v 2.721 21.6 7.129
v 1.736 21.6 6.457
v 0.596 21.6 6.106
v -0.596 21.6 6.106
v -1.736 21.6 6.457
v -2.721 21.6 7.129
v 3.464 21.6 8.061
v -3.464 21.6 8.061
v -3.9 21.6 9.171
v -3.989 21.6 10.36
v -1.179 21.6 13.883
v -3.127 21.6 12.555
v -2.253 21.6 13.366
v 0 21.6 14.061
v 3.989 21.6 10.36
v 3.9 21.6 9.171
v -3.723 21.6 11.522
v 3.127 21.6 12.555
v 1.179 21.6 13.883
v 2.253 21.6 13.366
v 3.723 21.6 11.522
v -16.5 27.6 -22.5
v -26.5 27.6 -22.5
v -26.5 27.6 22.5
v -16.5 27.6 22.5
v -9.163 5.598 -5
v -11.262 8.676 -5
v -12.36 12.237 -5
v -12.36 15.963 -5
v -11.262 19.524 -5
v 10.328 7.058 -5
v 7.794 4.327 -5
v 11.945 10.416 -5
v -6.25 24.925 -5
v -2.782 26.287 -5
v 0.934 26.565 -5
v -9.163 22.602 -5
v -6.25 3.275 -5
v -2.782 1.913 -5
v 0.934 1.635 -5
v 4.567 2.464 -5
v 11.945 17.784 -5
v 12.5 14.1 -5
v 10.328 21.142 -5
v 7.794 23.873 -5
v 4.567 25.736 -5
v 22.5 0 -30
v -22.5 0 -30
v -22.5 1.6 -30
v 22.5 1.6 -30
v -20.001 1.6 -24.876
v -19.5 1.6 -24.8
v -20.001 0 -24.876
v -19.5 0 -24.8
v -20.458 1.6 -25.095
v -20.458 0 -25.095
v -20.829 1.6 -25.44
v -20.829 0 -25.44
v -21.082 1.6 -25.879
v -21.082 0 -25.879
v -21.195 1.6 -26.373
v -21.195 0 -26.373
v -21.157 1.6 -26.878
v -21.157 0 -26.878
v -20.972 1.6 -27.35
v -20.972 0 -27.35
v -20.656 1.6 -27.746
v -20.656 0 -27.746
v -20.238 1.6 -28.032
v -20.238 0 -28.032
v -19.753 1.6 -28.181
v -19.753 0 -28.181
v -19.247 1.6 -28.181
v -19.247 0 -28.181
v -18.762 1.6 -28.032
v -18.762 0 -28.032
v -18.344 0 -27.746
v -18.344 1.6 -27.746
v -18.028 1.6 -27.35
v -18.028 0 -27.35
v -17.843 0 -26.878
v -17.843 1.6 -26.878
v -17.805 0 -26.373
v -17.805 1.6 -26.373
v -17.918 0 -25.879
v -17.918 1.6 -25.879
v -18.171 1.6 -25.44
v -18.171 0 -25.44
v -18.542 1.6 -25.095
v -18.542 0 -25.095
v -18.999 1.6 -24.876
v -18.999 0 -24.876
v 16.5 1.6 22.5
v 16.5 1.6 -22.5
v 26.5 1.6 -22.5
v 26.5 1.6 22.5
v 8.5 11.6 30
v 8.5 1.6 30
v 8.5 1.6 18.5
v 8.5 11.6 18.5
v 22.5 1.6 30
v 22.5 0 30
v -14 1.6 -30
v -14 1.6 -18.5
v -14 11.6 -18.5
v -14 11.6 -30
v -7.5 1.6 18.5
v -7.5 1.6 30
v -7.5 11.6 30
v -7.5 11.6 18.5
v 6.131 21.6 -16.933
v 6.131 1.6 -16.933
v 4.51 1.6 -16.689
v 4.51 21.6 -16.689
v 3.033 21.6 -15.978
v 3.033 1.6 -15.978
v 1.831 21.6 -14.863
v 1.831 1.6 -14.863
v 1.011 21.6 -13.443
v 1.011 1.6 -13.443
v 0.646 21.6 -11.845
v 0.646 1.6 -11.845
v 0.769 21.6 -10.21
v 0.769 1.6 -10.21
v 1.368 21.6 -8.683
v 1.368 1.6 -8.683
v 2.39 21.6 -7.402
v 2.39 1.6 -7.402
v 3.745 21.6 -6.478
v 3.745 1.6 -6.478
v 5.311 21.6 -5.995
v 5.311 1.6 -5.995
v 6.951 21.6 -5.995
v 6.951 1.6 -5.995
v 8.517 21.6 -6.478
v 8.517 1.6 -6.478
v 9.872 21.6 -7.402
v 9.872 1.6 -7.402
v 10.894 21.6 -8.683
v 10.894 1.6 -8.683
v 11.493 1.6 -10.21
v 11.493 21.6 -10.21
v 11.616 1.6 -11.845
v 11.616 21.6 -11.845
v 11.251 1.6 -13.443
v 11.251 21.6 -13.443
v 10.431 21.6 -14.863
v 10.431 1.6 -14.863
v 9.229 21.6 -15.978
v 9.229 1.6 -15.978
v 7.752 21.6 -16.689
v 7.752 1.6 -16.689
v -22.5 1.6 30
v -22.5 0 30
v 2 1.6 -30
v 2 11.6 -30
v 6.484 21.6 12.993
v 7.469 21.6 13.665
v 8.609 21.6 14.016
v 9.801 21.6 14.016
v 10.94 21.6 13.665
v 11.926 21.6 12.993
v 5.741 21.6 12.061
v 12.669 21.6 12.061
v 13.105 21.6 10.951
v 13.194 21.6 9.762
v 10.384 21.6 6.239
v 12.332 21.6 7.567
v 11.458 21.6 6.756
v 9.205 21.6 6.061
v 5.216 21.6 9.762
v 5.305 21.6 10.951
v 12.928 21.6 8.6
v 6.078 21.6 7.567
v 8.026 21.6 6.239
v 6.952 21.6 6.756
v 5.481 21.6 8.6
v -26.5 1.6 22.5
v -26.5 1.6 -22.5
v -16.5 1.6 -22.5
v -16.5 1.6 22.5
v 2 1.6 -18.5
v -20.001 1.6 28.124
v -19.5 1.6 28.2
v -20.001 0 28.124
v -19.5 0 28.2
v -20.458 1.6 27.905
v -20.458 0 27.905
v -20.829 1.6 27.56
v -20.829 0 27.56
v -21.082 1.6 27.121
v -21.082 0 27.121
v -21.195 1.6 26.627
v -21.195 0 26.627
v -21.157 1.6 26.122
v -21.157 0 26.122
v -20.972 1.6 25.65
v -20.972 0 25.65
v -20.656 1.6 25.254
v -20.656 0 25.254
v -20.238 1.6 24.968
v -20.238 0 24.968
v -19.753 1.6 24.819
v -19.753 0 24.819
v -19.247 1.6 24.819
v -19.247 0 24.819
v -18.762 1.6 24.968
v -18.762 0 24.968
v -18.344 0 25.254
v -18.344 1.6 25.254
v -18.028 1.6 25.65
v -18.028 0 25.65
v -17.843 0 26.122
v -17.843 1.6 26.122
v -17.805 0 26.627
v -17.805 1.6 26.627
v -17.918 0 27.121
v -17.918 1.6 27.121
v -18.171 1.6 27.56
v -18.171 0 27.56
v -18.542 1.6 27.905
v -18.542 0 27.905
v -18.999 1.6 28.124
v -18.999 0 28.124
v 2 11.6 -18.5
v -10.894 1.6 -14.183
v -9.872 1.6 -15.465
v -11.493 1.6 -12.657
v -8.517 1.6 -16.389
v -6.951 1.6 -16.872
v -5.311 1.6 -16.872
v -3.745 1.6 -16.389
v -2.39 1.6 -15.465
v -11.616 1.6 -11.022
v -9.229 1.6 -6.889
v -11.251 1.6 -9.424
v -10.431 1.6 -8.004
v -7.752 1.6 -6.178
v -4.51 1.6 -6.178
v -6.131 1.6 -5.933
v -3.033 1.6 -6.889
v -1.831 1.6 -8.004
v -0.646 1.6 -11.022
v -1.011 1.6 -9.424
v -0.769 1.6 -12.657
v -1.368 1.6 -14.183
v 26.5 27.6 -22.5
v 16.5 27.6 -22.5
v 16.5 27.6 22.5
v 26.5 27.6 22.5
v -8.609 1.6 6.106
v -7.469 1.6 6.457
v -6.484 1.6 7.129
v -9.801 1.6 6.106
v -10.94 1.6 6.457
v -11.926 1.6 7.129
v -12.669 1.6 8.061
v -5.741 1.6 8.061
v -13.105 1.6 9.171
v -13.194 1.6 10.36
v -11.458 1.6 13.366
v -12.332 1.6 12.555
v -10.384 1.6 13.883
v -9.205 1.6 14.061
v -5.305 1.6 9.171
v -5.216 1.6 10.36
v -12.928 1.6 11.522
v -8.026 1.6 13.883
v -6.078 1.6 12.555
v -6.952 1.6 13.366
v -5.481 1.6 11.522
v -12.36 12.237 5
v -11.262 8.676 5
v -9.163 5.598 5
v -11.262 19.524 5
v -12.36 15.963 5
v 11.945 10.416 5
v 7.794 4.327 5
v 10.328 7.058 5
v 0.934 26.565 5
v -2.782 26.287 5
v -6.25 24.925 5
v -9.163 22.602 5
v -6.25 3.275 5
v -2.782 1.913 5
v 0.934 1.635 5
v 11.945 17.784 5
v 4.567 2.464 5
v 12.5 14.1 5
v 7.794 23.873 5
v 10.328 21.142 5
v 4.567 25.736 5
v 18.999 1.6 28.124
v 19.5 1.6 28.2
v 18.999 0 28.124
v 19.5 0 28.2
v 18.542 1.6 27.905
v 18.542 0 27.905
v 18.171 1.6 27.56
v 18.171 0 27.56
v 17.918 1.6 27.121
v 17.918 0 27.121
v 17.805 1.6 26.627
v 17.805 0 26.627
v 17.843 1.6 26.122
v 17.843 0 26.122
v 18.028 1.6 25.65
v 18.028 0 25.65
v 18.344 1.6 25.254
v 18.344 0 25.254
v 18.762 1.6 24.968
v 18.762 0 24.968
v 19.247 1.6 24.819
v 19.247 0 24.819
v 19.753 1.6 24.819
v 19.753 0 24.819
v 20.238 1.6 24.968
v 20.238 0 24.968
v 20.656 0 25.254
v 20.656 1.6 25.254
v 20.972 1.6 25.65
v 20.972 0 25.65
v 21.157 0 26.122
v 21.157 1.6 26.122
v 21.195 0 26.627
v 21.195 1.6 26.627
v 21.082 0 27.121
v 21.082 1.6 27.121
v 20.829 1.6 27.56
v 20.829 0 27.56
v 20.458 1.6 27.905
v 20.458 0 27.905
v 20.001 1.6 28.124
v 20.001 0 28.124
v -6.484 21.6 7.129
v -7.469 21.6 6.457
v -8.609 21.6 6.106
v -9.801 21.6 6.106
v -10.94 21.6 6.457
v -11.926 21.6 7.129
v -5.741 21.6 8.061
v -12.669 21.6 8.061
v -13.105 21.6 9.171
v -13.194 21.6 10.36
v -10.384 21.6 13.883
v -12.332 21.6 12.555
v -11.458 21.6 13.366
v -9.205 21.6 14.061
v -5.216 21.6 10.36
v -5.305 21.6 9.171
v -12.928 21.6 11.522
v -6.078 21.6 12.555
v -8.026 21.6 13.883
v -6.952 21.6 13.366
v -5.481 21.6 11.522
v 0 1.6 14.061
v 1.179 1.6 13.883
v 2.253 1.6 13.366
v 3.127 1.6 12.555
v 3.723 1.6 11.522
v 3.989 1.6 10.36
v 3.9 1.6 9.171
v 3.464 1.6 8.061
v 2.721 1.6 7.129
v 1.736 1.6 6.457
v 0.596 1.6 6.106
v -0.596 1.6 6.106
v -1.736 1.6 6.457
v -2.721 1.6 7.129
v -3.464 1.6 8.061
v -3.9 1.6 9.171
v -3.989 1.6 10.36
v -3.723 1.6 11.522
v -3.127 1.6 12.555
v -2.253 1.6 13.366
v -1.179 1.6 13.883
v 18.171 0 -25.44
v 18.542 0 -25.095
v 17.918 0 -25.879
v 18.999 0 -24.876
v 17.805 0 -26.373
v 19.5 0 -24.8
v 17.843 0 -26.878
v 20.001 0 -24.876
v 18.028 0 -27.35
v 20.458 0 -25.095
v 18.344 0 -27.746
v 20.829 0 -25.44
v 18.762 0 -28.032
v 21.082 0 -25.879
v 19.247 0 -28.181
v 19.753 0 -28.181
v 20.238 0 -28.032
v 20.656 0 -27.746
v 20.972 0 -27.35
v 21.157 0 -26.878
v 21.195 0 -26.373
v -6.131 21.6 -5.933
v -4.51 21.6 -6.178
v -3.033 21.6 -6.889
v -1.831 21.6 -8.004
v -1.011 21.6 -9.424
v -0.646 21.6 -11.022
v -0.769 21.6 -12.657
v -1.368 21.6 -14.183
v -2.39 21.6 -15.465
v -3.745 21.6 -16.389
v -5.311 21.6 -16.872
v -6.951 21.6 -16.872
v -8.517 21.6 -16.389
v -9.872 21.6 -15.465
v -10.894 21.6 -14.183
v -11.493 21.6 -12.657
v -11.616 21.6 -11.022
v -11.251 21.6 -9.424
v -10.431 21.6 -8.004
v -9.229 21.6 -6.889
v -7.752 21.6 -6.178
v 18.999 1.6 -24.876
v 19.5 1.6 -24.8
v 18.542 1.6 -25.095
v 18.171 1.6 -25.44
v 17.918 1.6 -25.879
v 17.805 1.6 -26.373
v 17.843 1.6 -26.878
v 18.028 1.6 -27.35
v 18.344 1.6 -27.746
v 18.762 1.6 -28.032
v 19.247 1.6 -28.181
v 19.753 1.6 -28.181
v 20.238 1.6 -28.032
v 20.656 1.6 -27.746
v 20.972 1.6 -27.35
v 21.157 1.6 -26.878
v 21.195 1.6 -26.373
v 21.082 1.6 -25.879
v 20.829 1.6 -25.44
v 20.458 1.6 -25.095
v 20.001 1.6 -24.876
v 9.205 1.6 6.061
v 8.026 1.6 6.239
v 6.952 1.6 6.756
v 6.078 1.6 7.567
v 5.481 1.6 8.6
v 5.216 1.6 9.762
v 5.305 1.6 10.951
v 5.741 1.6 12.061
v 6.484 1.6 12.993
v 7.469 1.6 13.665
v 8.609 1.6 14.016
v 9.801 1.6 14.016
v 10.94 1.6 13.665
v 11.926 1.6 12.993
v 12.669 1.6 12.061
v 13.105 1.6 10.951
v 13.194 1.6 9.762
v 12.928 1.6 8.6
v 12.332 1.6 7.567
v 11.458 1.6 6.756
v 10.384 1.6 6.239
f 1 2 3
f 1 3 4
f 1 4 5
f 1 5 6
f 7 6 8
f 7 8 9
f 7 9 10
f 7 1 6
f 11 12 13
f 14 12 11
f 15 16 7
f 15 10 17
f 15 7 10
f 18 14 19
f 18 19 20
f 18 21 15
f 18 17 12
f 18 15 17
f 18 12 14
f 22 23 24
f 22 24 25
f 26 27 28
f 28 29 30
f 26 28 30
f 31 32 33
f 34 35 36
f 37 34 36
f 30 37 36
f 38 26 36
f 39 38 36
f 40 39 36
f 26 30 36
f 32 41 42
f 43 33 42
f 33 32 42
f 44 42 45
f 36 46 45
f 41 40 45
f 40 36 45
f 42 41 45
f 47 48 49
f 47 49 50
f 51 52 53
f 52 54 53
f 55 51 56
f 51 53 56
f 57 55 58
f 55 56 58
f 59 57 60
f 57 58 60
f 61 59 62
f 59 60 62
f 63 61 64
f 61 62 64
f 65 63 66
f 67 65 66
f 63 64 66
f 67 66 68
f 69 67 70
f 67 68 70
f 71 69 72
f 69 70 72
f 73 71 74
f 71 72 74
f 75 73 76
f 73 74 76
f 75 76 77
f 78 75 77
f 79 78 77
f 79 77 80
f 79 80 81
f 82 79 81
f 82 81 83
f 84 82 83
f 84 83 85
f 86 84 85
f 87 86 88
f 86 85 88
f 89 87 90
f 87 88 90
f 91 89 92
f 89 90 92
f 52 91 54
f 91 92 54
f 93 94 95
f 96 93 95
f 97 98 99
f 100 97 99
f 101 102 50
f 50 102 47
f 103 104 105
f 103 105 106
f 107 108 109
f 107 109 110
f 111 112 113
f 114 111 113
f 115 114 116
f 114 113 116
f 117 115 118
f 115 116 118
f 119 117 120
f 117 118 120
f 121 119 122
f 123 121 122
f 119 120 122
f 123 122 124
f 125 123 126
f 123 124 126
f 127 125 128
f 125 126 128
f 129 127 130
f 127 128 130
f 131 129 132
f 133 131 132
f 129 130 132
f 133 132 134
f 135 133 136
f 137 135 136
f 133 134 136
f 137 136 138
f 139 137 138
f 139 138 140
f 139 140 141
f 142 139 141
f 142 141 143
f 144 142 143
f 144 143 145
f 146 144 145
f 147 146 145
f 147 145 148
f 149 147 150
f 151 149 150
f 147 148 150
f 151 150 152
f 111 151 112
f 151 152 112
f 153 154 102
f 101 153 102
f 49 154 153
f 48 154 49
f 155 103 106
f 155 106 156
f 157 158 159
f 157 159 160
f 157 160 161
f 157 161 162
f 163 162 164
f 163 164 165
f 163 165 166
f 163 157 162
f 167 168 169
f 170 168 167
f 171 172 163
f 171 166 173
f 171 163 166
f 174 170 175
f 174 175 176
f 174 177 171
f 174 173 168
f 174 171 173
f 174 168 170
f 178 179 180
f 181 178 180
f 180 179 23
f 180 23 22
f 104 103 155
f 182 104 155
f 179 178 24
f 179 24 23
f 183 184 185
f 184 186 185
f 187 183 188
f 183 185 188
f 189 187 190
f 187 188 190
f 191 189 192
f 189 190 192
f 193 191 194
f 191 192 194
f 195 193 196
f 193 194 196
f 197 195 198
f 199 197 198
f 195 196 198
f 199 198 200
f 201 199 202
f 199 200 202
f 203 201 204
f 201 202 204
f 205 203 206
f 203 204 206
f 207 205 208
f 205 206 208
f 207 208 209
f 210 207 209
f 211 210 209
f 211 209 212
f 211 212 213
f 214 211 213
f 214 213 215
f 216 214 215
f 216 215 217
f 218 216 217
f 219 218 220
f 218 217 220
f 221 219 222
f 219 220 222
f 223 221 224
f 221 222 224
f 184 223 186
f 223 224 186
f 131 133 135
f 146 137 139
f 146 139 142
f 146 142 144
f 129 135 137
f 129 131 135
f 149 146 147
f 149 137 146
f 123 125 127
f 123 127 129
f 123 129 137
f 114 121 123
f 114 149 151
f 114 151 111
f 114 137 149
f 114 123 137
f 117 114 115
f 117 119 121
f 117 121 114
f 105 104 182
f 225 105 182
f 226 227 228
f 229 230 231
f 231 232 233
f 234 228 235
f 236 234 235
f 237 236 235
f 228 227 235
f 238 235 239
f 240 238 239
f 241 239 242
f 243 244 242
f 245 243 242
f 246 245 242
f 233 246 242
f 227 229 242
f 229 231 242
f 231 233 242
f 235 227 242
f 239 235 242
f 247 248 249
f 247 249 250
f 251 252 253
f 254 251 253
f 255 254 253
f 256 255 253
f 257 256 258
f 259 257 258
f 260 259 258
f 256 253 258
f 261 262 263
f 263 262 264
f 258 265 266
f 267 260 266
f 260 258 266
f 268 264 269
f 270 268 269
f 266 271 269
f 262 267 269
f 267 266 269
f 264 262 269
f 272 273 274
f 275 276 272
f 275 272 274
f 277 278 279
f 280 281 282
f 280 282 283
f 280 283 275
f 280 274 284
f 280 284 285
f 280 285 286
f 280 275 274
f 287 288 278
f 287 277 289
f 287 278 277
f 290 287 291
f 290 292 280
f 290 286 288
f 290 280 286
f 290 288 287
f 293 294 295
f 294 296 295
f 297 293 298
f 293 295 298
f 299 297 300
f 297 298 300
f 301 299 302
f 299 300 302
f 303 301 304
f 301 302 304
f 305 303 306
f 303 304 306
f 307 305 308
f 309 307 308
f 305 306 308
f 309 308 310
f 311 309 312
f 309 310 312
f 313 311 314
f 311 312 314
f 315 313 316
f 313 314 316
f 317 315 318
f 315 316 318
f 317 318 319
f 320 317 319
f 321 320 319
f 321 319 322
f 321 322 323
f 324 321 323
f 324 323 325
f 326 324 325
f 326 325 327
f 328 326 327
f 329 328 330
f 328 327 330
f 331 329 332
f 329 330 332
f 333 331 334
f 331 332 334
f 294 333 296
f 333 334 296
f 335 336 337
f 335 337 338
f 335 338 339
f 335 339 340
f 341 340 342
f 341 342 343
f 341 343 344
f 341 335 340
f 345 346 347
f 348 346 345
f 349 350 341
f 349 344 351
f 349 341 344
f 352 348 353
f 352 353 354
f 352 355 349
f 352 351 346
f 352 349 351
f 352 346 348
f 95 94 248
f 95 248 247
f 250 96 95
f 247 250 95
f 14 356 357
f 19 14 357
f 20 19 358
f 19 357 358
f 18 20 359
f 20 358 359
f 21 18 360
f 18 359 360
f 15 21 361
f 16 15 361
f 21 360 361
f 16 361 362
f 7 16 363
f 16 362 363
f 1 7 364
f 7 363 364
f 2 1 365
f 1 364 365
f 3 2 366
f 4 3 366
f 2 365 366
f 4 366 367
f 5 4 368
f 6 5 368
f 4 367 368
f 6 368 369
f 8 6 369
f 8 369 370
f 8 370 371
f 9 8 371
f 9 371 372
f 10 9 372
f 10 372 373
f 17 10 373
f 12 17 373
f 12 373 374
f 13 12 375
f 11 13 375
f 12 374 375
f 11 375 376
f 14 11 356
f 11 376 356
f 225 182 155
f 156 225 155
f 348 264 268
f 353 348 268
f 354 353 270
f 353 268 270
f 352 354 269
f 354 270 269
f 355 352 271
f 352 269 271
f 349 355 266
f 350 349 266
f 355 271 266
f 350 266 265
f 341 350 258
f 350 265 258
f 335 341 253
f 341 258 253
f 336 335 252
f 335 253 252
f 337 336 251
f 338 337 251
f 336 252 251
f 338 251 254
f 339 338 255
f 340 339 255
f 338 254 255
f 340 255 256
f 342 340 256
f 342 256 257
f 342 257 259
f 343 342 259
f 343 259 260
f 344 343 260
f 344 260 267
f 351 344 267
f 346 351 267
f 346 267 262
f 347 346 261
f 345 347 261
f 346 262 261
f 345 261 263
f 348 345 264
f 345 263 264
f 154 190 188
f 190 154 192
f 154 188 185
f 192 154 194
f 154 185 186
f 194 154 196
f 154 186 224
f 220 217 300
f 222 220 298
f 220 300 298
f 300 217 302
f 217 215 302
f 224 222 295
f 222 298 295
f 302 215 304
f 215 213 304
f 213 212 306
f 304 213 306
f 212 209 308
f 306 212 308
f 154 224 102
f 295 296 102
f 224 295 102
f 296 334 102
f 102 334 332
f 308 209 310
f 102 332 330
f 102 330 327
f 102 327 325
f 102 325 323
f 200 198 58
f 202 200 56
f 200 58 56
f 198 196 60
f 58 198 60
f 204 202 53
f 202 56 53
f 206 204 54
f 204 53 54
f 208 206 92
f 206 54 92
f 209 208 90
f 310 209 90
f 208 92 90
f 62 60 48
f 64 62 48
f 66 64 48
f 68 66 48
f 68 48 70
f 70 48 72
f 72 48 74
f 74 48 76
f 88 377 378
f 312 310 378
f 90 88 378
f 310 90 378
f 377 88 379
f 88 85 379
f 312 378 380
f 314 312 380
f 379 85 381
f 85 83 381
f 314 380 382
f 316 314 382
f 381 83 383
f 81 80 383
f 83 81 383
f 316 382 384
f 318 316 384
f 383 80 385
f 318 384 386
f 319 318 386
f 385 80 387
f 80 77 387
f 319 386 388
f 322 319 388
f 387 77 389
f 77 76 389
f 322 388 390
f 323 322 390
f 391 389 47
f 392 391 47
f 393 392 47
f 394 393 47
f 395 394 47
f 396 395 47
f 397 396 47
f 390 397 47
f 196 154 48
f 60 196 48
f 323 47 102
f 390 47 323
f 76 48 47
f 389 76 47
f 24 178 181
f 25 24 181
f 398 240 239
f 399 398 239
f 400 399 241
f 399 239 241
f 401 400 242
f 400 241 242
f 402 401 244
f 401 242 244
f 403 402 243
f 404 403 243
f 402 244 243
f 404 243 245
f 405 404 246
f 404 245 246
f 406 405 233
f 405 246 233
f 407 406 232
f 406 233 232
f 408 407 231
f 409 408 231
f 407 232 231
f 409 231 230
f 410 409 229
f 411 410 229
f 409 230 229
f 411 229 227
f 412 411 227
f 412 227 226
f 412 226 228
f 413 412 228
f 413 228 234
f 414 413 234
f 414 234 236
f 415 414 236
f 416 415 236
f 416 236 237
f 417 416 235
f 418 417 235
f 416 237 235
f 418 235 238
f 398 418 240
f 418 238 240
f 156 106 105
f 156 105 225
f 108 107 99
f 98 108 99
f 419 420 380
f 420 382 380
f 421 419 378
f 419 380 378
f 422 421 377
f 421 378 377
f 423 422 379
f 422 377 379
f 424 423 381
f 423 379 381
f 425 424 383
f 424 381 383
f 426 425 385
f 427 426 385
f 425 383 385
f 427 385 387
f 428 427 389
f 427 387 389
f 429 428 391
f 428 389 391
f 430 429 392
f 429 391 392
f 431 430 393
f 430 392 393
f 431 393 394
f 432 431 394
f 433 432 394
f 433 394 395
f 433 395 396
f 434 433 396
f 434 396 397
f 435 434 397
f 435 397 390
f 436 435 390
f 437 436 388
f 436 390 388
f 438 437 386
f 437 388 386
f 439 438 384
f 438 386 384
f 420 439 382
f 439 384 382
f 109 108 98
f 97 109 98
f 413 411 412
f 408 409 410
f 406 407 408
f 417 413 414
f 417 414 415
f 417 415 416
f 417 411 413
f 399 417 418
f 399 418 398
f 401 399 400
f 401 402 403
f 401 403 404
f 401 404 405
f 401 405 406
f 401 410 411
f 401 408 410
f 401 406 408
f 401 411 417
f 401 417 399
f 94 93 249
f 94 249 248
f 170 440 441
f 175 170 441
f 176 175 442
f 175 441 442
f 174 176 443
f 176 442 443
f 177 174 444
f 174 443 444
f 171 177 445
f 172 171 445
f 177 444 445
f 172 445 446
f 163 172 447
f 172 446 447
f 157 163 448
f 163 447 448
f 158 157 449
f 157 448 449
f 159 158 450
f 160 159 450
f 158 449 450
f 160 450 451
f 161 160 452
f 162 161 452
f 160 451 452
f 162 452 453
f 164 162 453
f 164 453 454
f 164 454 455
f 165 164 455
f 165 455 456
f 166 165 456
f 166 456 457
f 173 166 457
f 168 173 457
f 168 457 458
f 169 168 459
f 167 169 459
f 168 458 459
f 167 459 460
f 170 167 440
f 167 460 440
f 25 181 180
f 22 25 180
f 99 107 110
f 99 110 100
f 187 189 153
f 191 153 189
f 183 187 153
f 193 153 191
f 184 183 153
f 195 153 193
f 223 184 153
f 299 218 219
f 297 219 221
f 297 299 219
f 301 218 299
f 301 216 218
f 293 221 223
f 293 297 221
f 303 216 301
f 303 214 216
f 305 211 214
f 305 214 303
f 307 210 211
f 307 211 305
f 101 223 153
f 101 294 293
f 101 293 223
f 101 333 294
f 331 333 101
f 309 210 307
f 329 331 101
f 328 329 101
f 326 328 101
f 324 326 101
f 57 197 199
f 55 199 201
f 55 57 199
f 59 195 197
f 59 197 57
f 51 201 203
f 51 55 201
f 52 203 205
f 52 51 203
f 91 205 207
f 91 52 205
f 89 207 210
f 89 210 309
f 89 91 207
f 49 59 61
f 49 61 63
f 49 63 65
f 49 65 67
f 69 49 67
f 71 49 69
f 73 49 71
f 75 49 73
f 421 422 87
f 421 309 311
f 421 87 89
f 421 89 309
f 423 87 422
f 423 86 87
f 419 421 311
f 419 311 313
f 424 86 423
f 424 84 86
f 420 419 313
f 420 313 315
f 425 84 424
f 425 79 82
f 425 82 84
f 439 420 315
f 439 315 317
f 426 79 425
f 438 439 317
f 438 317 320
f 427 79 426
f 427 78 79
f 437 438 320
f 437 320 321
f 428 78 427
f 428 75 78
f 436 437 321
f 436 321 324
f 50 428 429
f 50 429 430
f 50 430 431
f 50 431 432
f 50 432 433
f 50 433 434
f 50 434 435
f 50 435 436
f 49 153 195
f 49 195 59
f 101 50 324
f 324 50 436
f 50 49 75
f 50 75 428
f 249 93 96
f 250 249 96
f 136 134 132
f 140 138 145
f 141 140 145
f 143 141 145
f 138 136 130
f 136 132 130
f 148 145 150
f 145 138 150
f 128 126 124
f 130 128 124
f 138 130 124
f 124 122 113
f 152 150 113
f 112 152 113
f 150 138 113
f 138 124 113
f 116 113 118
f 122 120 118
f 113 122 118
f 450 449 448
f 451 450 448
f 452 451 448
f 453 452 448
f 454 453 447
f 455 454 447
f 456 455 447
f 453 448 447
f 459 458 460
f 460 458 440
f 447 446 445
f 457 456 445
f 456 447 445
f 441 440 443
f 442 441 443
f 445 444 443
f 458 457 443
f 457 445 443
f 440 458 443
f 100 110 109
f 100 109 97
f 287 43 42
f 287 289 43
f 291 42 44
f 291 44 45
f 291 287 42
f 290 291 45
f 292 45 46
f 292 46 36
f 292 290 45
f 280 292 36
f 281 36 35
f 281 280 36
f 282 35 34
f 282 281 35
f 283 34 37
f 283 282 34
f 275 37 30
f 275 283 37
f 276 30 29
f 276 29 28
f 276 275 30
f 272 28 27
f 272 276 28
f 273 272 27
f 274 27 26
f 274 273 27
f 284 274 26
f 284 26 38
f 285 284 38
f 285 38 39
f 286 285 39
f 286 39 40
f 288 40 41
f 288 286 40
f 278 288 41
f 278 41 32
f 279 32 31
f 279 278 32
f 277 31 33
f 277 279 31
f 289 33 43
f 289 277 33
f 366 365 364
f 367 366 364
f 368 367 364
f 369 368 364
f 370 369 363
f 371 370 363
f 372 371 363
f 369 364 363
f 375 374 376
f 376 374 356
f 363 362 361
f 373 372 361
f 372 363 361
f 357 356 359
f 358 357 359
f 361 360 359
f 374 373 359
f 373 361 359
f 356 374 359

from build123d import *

# Parameters (mm, degrees)
ESQUISSE1_W               = 45
ESQUISSE1_H               = 60
BOSS_EXTRU_1_DEPTH        = 1.6
ESQUISSE2_W               = 10
ESQUISSE2_H               = 45
BOSS_EXTRU_2_DEPTH        = 26
BOSS_EXTRU_2_2_DEPTH      = 26
ESQUISSE5_W               = 1.7
ESQUISSE5_H               = 1.6
D_GAGEMENT_M31_AT_2_COUNT = 2
D_GAGEMENT_M31_AT_2_PITCH = 53
D_GAGEMENT_M31_AT_3_COUNT = 2
D_GAGEMENT_M31_AT_3_PITCH = 39
D_GAGEMENT_M31_AT_4_COUNT = 2
D_GAGEMENT_M31_AT_4_PITCH = 65.802735505
ESQUISSE6_W               = 16
ESQUISSE6_H               = 11.5
BOSS_EXTRU_3_DEPTH        = 10
BOSS_EXTRU_3_2_DEPTH      = 10
ESQUISSE8_R               = 12.5
BOSS_EXTRU_6_DEPTH        = 5
ESQUISSE7_R               = 5.5
BOSS_EXTRU_4_DEPTH        = 20
BOSS_EXTRU_4_2_DEPTH      = 20
ESQUISSE7_R_2             = 4
BOSS_EXTRU_4_3_DEPTH      = 20
BOSS_EXTRU_4_4_DEPTH      = 20
BOSS_EXTRU_4_5_DEPTH      = 20


with BuildPart() as part:
    # Esquisse1 → Boss.-Extru.1 (new body)
    with BuildSketch(Plane(origin=(0, 0, 0), x_dir=(1, 0, 0), z_dir=(0, 1, 0))):
        Rectangle(ESQUISSE1_W, ESQUISSE1_H)
    extrude(amount=BOSS_EXTRU_1_DEPTH)

    # Esquisse5 → Dégagement M31 (revolve, cut)
    with BuildSketch(Plane(origin=(-19.5, 1.6, -26.5), x_dir=(0, 0, 1), z_dir=(1, 0, 0))):
        with Locations((0.85, 0.8)):
            Rectangle(ESQUISSE5_W, ESQUISSE5_H)
    d_gagement_m31 = revolve(axis=Axis((-19.5, 7.95, -26.5), (0, -1, 0)), mode=Mode.SUBTRACT)

    # Dégagement M31 at 2: Dégagement M31 ×2
    with Locations(*[(0, 0, i * D_GAGEMENT_M31_AT_2_PITCH) for i in range(1, D_GAGEMENT_M31_AT_2_COUNT)]):
        add(d_gagement_m31, mode=Mode.SUBTRACT)

    # Dégagement M31 at 3: Dégagement M31 ×2
    with Locations(*[(i * D_GAGEMENT_M31_AT_3_PITCH, 0, 0) for i in range(1, D_GAGEMENT_M31_AT_3_COUNT)]):
        add(d_gagement_m31, mode=Mode.SUBTRACT)

    # Dégagement M31 at 4: Dégagement M31 ×2
    with Locations(*[Vector(0.5926805276472259, 0, 0.8054376401359735) * (i * D_GAGEMENT_M31_AT_4_PITCH) for i in range(1, D_GAGEMENT_M31_AT_4_COUNT)]):
        add(d_gagement_m31, mode=Mode.SUBTRACT)


with BuildPart() as body_2:
    # Esquisse2 → Boss.-Extru.2 (new body)
    with BuildSketch(Plane(origin=(0, 1.6, 0), x_dir=(1, 0, 0), z_dir=(0, 1, 0))):
        with Locations((-21.5, 0)):
            Rectangle(ESQUISSE2_W, ESQUISSE2_H)
    extrude(amount=BOSS_EXTRU_2_DEPTH)


with BuildPart() as body_3:
    # Esquisse2 → Boss.-Extru.2 2 (new body)
    with BuildSketch(Plane(origin=(0, 1.6, 0), x_dir=(1, 0, 0), z_dir=(0, 1, 0))):
        with Locations((21.5, 0)):
            Rectangle(ESQUISSE2_W, ESQUISSE2_H)
    extrude(amount=BOSS_EXTRU_2_2_DEPTH)


with BuildPart() as body_4:
    # Esquisse6 → Boss.-Extru.3 (new body)
    with BuildSketch(Plane(origin=(0, 1.6, 0), x_dir=(1, 0, 0), z_dir=(0, 1, 0))):
        with Locations((0.5, -24.25)):
            Rectangle(ESQUISSE6_W, ESQUISSE6_H)
    extrude(amount=BOSS_EXTRU_3_DEPTH)


with BuildPart() as body_5:
    # Esquisse6 → Boss.-Extru.3 2 (new body)
    with BuildSketch(Plane(origin=(0, 1.6, 0), x_dir=(1, 0, 0), z_dir=(0, 1, 0))):
        with Locations((-6, 24.25)):
            Rectangle(ESQUISSE6_W, ESQUISSE6_H)
    extrude(amount=BOSS_EXTRU_3_2_DEPTH)


with BuildPart() as body_6:
    # Esquisse8 → Boss.-Extru.6 (new, symmetric)
    with BuildSketch(Plane.XY):
        with Locations((0, 14.1)):
            Circle(ESQUISSE8_R)
    extrude(amount=BOSS_EXTRU_6_DEPTH, both=True)


with BuildPart() as body_7:
    # Esquisse7 → Boss.-Extru.4 (new body)
    with BuildSketch(Plane(origin=(0, 1.6, 0), x_dir=(1, 0, 0), z_dir=(0, 1, 0))):
        with Locations(Location((-6.130897593, 11.433498553, 0), (0, 0, 270))):
            Circle(ESQUISSE7_R)
    extrude(amount=BOSS_EXTRU_4_DEPTH)


with BuildPart() as body_8:
    # Esquisse7 → Boss.-Extru.4 2 (new body)
    with BuildSketch(Plane(origin=(0, 1.6, 0), x_dir=(1, 0, 0), z_dir=(0, 1, 0))):
        with Locations(Location((6.130897593, 11.433498553, 0), (0, 0, 90))):
            Circle(ESQUISSE7_R)
    extrude(amount=BOSS_EXTRU_4_2_DEPTH)


with BuildPart() as body_9:
    # Esquisse7 → Boss.-Extru.4 3 (new body)
    with BuildSketch(Plane(origin=(0, 1.6, 0), x_dir=(1, 0, 0), z_dir=(0, 1, 0))):
        with Locations(Location((0, -10.061105761, 0), (0, 0, 270))):
            Circle(ESQUISSE7_R_2)
    extrude(amount=BOSS_EXTRU_4_3_DEPTH)


with BuildPart() as body_10:
    # Esquisse7 → Boss.-Extru.4 4 (new body)
    with BuildSketch(Plane(origin=(0, 1.6, 0), x_dir=(1, 0, 0), z_dir=(0, 1, 0))):
        with Locations(Location((-9.204902398, -10.061105761, 0), (0, 0, 270))):
            Circle(ESQUISSE7_R_2)
    extrude(amount=BOSS_EXTRU_4_4_DEPTH)


with BuildPart() as body_11:
    # Esquisse7 → Boss.-Extru.4 5 (new body)
    with BuildSketch(Plane(origin=(0, 1.6, 0), x_dir=(1, 0, 0), z_dir=(0, 1, 0))):
        with Locations(Location((9.204902398, -10.061105761, 0), (0, 0, 90))):
            Circle(ESQUISSE7_R_2)
    extrude(amount=BOSS_EXTRU_4_5_DEPTH)


solid = Compound([part.part, body_2.part, body_3.part, body_4.part, body_5.part, body_6.part, body_7.part, body_8.part, body_9.part, body_10.part, body_11.part])
